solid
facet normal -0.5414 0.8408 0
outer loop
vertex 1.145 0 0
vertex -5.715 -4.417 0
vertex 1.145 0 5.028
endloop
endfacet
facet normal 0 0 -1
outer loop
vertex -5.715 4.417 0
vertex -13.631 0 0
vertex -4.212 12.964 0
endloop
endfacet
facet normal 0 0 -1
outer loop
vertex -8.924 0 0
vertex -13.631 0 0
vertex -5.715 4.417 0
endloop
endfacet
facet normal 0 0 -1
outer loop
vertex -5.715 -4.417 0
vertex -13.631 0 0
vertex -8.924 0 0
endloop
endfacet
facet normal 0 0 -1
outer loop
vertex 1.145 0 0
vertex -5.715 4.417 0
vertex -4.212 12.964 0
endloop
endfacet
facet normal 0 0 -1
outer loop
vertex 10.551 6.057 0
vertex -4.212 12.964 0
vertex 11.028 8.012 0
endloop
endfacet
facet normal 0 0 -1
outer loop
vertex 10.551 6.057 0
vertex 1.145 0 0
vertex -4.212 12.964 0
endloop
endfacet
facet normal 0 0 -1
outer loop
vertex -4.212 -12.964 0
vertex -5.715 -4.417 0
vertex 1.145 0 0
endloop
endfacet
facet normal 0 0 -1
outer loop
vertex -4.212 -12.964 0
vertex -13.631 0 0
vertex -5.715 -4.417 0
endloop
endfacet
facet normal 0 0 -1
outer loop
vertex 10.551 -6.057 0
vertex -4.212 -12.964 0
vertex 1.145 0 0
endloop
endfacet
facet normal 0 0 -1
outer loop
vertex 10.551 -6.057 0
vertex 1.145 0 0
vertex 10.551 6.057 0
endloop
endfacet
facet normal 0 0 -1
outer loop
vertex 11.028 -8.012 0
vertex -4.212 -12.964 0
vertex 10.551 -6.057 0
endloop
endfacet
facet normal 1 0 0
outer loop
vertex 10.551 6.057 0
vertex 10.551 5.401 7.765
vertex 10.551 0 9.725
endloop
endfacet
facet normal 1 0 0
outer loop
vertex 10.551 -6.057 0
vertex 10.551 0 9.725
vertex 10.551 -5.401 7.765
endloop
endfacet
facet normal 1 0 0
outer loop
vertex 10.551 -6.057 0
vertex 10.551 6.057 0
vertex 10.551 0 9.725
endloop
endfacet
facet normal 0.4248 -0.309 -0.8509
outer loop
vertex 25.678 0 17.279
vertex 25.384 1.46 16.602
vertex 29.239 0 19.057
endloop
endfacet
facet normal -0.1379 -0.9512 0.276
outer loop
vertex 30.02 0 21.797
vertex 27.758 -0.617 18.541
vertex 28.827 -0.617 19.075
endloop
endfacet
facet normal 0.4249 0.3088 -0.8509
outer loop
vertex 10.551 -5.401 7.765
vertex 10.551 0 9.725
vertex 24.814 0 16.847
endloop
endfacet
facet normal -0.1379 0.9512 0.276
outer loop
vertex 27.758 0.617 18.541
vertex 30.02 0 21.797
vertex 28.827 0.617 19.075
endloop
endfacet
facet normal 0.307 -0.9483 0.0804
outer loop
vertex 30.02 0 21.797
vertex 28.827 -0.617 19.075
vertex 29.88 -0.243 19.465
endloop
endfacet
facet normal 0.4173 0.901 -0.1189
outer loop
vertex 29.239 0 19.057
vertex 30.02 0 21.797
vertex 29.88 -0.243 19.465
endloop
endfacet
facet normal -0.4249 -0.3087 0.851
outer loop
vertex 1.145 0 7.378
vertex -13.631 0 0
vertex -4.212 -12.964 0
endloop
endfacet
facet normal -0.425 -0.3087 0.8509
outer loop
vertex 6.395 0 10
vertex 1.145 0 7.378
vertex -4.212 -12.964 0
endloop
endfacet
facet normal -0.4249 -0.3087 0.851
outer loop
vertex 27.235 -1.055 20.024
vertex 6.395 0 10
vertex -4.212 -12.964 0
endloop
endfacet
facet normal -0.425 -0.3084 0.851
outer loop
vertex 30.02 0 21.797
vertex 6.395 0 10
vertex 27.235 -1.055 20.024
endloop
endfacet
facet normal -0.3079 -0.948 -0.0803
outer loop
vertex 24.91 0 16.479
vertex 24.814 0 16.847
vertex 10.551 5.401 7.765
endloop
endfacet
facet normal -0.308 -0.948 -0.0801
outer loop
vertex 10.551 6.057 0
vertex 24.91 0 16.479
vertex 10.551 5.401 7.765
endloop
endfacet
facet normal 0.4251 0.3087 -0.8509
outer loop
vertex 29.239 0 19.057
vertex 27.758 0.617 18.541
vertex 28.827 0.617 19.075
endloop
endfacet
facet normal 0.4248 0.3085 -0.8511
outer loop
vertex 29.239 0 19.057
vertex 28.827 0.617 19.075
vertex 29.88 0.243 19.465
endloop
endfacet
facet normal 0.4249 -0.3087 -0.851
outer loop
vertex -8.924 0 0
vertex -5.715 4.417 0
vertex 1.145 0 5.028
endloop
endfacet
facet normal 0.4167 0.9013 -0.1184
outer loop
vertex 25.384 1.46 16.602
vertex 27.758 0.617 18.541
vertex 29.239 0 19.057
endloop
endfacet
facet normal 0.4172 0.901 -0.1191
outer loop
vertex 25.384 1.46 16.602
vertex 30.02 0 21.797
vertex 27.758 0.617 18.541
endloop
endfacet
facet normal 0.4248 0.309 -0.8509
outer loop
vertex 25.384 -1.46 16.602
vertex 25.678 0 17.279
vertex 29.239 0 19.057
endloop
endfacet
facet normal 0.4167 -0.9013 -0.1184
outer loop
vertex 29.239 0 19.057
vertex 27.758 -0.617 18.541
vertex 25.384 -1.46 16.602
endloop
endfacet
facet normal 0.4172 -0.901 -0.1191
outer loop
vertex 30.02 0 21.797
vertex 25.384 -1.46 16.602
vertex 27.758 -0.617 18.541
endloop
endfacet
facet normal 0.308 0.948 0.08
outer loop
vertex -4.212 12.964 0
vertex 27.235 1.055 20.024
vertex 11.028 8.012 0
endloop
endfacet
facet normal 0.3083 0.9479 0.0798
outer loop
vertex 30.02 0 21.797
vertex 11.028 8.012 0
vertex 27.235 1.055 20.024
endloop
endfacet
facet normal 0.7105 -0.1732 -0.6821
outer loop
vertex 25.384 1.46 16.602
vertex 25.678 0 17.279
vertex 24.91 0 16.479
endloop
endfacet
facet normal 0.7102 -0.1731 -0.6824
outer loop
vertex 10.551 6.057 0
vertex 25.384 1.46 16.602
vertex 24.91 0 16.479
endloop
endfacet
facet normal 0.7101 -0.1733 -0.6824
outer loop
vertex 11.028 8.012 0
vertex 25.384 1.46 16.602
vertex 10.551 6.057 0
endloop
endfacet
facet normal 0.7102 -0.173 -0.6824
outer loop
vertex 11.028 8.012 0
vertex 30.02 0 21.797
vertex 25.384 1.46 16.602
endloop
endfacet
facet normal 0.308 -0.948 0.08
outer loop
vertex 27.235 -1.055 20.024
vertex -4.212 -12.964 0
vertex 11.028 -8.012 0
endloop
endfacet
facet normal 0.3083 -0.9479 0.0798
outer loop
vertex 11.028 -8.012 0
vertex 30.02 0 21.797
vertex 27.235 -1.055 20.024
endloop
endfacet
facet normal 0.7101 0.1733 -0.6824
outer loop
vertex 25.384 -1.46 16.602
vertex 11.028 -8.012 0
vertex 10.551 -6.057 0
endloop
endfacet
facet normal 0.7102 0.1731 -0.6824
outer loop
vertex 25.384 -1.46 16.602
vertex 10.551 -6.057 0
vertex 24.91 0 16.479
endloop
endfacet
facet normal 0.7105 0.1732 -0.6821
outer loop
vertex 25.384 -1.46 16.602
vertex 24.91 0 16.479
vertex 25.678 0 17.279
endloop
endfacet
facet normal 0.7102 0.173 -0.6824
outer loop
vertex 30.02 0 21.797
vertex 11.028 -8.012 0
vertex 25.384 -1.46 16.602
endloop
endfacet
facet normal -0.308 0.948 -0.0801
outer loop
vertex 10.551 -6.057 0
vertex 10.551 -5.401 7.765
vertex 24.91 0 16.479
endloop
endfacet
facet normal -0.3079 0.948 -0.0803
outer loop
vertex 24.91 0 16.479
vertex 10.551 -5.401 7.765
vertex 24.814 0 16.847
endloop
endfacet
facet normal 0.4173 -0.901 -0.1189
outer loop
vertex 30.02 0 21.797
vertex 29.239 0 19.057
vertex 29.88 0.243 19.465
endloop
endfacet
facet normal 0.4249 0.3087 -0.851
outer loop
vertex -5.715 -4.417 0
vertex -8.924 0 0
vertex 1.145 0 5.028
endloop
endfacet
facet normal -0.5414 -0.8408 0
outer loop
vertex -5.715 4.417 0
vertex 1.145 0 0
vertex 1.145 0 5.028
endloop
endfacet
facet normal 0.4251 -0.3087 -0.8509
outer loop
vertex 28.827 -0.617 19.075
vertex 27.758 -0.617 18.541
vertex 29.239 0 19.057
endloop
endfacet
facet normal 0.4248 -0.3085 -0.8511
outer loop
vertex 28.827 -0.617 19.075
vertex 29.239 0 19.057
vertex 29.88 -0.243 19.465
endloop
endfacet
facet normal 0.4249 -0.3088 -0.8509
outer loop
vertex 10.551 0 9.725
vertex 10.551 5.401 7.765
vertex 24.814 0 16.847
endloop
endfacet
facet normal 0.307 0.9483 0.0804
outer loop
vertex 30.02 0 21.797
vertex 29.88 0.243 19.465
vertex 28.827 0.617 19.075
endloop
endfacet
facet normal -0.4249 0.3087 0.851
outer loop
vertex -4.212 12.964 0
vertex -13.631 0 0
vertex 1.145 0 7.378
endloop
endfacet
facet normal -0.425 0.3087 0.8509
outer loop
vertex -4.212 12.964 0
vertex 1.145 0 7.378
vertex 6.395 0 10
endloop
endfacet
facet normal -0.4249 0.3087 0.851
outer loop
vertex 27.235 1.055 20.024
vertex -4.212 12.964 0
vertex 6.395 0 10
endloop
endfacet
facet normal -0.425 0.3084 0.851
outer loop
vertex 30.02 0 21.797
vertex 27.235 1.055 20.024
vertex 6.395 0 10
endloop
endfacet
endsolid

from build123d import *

# Parameters (mm, degrees)
F10_DEPTH = 2
F11_DEPTH = 2
F12_DEPTH = 2
F13_DEPTH = 2
F14_W     = 8.485019207
F14_H     = 5.5162683129
F15_DEPTH = 25.4
F16_W     = 22.2342889756
F16_H     = 4.6487008221
F17_DEPTH = 25.4
F18_W     = 7.9449899495
F18_H     = 7.2886322159
F19_DEPTH = 25.4
F20_W     = 5.9225577861
F20_H     = 11.3939000294
F21_DEPTH = 25.4
F22_DEPTH = 25.4
F24_DEPTH = 10
F25_W     = 57.7732250094
F25_H     = 30.5333668366
F26_DEPTH = 25.4
F27_W     = 39.3364997581
F27_H     = 21.5767812915
F28_DEPTH = 25.4


with BuildPart() as f10:
    # F9 (on 3pt) → F10 (new body)
    with BuildSketch(Plane(origin=(3.3858576339, 10.4205982991, 0.8801059814), x_dir=(-0.9513782964, 0.3069321376, 0.0259229655), z_dir=(0.308024897, 0.9480031547, 0.0800667316))):
        Polygon((7.9863190401, -1.0910055423), (-27.9953896476, 21.7198480533), (-8.0322433603, -0.6742785071), align=None)
    extrude(amount=-F10_DEPTH)

    # F7 (on 3pt) → F11 (join)
    with BuildSketch(Plane(origin=(-2.4612159584, 1.7881780643, 4.9288143129), x_dir=(0.9052277817, 0.144920932, 0.3994503557), z_dir=(-0.4249266563, 0.3087272871, 0.8509552274))):
        Polygon((35.8818855958, -7.4339114282), (-1.9342501918, 12.1864421859), (-12.3389909213, 0), align=None)
    extrude(amount=-F11_DEPTH)

    # F6 (on 3pt) → F12 (join)
    with BuildSketch(Plane(origin=(-2.4612159584, -1.7881780643, 4.9288143129), x_dir=(0.9052277817, -0.144920932, 0.3994503557), z_dir=(-0.4249266563, -0.3087272871, 0.8509552274))):
        Polygon((-1.9342501918, -12.1864421859), (35.8818855958, 7.4339114282), (-12.3389909213, 0), align=None)
    extrude(amount=-F12_DEPTH)

    # F5 (on face) → F13 (join)
    with BuildSketch(Plane(origin=(3.3858576339, -10.4205982991, 0.8801059814), x_dir=(0.9513782964, 0.3069321376, -0.0259229655), z_dir=(0.308024897, -0.9480031547, 0.0800667316))):
        Polygon((8.0322433603, -0.6742785071), (27.9953896476, 21.7198480533), (-7.9863190401, -1.0910055423), align=None)
    extrude(amount=-F13_DEPTH)

    # F14 (on face) → F15 (cut)
    with BuildSketch(Plane(origin=(3.3858576339, -10.4205982991, 0.8801059814), x_dir=(0.9513782964, 0.3069321376, -0.0259229655), z_dir=(0.308024897, -0.9480031547, 0.0800667316))):
        with Locations((25.7894098759, 19.5572990924)):
            Rectangle(F14_W, F14_H)
    extrude(amount=F15_DEPTH, mode=Mode.SUBTRACT)

    # F16 (on face) → F17 (cut)
    with BuildSketch(Plane(origin=(-2.4612159584, 1.7881780643, 4.9288143129), x_dir=(0.9052277817, 0.144920932, 0.3994503557), z_dir=(-0.4249266563, 0.3087272871, 0.8509552274))):
        with Locations((32.4524613097, -6.6612462979)):
            Rectangle(F16_W, F16_H)
    extrude(amount=F17_DEPTH, mode=Mode.SUBTRACT)

    # F18 (on face) → F19 (cut)
    with BuildSketch(Plane(origin=(-2.4612159584, -1.7881780643, 4.9288143129), x_dir=(0.9052277817, -0.144920932, 0.3994503557), z_dir=(-0.4249266563, -0.3087272871, 0.8509552274))):
        with Locations((35.5167929083, 5.7378442725)):
            Rectangle(F18_W, F18_H)
    extrude(amount=F19_DEPTH, mode=Mode.SUBTRACT)

    # F20 (on face) → F21 (cut)
    with BuildSketch(Plane(origin=(3.3858576339, 10.4205982991, 0.8801059814), x_dir=(-0.9513782964, 0.3069321376, 0.0259229655), z_dir=(0.308024897, 0.9480031547, 0.0800667316))):
        with Locations((-26.7476057634, 18.5779468156)):
            Rectangle(F20_W, F20_H)
    extrude(amount=F21_DEPTH, mode=Mode.SUBTRACT)

    # F0 (on Top) → F22 (cut)
    with BuildSketch(Plane.XY):
        Polygon((11.027559638, -8.0119910571), (11.027559638, 8.0119910571), (-4.2121529688, 12.963673848), (-13.6308133385, 0), (-4.2121529688, -12.963673848), align=None)
    extrude(amount=-F22_DEPTH, mode=Mode.SUBTRACT)

    # F23 (on face) → F24 (join)
    with BuildSketch(Plane(origin=(0, 0, 0), x_dir=(1, 0, 0), z_dir=(0, 0, -1))):
        Polygon((6.725183616, -3.5935375892), (1.1445587857, 0), (-5.7149456211, -4.4170478538), (-1.6444061956, -10.0196647256), (6.725183616, -7.3002201464), align=None)
        Polygon((-1.6444061956, 10.0196647256), (-5.7149456211, 4.4170478538), (1.1445587857, 0), (6.725183616, 3.5935375892), (6.725183616, 7.3002201464), align=None)
        Polygon((6.725183616, 3.5935375892), (1.1445587857, 0), (6.725183616, -3.5935375892), align=None)
        Polygon((6.725183616, 7.3002201464), (6.725183616, 3.5935375892), (10.5510387165, 6.0571244693), align=None)
        Polygon((6.725183616, 3.5935375892), (6.725183616, -3.5935375892), (10.5510387165, -6.0571244693), (10.5510387165, 6.0571244693), align=None)
        Polygon((10.5510387165, -6.0571244693), (6.725183616, -3.5935375892), (6.725183616, -7.3002201464), align=None)
    extrude(amount=-F24_DEPTH)

    # F25 (on face) → F26 (cut)
    with BuildSketch(Plane(origin=(-2.4612159584, 1.7881780643, 4.9288143129), x_dir=(0.9052277817, 0.144920932, 0.3994503557), z_dir=(-0.4249266563, 0.3087272871, 0.8509552274))):
        with Locations((7.6596103609, -0.1687561162)):
            Rectangle(F25_W, F25_H)
    extrude(amount=F26_DEPTH, mode=Mode.SUBTRACT)

    # F27 (on face) → F28 (cut)
    with BuildSketch(Plane(origin=(-2.4612159584, -1.7881780643, 4.9288143129), x_dir=(0.9052277817, -0.144920932, 0.3994503557), z_dir=(-0.4249266563, -0.3087272871, 0.8509552274))):
        with Locations((5.8207563125, -4.5227890369)):
            Rectangle(F27_W, F27_H)
    extrude(amount=F28_DEPTH, mode=Mode.SUBTRACT)


solid = f10.part
